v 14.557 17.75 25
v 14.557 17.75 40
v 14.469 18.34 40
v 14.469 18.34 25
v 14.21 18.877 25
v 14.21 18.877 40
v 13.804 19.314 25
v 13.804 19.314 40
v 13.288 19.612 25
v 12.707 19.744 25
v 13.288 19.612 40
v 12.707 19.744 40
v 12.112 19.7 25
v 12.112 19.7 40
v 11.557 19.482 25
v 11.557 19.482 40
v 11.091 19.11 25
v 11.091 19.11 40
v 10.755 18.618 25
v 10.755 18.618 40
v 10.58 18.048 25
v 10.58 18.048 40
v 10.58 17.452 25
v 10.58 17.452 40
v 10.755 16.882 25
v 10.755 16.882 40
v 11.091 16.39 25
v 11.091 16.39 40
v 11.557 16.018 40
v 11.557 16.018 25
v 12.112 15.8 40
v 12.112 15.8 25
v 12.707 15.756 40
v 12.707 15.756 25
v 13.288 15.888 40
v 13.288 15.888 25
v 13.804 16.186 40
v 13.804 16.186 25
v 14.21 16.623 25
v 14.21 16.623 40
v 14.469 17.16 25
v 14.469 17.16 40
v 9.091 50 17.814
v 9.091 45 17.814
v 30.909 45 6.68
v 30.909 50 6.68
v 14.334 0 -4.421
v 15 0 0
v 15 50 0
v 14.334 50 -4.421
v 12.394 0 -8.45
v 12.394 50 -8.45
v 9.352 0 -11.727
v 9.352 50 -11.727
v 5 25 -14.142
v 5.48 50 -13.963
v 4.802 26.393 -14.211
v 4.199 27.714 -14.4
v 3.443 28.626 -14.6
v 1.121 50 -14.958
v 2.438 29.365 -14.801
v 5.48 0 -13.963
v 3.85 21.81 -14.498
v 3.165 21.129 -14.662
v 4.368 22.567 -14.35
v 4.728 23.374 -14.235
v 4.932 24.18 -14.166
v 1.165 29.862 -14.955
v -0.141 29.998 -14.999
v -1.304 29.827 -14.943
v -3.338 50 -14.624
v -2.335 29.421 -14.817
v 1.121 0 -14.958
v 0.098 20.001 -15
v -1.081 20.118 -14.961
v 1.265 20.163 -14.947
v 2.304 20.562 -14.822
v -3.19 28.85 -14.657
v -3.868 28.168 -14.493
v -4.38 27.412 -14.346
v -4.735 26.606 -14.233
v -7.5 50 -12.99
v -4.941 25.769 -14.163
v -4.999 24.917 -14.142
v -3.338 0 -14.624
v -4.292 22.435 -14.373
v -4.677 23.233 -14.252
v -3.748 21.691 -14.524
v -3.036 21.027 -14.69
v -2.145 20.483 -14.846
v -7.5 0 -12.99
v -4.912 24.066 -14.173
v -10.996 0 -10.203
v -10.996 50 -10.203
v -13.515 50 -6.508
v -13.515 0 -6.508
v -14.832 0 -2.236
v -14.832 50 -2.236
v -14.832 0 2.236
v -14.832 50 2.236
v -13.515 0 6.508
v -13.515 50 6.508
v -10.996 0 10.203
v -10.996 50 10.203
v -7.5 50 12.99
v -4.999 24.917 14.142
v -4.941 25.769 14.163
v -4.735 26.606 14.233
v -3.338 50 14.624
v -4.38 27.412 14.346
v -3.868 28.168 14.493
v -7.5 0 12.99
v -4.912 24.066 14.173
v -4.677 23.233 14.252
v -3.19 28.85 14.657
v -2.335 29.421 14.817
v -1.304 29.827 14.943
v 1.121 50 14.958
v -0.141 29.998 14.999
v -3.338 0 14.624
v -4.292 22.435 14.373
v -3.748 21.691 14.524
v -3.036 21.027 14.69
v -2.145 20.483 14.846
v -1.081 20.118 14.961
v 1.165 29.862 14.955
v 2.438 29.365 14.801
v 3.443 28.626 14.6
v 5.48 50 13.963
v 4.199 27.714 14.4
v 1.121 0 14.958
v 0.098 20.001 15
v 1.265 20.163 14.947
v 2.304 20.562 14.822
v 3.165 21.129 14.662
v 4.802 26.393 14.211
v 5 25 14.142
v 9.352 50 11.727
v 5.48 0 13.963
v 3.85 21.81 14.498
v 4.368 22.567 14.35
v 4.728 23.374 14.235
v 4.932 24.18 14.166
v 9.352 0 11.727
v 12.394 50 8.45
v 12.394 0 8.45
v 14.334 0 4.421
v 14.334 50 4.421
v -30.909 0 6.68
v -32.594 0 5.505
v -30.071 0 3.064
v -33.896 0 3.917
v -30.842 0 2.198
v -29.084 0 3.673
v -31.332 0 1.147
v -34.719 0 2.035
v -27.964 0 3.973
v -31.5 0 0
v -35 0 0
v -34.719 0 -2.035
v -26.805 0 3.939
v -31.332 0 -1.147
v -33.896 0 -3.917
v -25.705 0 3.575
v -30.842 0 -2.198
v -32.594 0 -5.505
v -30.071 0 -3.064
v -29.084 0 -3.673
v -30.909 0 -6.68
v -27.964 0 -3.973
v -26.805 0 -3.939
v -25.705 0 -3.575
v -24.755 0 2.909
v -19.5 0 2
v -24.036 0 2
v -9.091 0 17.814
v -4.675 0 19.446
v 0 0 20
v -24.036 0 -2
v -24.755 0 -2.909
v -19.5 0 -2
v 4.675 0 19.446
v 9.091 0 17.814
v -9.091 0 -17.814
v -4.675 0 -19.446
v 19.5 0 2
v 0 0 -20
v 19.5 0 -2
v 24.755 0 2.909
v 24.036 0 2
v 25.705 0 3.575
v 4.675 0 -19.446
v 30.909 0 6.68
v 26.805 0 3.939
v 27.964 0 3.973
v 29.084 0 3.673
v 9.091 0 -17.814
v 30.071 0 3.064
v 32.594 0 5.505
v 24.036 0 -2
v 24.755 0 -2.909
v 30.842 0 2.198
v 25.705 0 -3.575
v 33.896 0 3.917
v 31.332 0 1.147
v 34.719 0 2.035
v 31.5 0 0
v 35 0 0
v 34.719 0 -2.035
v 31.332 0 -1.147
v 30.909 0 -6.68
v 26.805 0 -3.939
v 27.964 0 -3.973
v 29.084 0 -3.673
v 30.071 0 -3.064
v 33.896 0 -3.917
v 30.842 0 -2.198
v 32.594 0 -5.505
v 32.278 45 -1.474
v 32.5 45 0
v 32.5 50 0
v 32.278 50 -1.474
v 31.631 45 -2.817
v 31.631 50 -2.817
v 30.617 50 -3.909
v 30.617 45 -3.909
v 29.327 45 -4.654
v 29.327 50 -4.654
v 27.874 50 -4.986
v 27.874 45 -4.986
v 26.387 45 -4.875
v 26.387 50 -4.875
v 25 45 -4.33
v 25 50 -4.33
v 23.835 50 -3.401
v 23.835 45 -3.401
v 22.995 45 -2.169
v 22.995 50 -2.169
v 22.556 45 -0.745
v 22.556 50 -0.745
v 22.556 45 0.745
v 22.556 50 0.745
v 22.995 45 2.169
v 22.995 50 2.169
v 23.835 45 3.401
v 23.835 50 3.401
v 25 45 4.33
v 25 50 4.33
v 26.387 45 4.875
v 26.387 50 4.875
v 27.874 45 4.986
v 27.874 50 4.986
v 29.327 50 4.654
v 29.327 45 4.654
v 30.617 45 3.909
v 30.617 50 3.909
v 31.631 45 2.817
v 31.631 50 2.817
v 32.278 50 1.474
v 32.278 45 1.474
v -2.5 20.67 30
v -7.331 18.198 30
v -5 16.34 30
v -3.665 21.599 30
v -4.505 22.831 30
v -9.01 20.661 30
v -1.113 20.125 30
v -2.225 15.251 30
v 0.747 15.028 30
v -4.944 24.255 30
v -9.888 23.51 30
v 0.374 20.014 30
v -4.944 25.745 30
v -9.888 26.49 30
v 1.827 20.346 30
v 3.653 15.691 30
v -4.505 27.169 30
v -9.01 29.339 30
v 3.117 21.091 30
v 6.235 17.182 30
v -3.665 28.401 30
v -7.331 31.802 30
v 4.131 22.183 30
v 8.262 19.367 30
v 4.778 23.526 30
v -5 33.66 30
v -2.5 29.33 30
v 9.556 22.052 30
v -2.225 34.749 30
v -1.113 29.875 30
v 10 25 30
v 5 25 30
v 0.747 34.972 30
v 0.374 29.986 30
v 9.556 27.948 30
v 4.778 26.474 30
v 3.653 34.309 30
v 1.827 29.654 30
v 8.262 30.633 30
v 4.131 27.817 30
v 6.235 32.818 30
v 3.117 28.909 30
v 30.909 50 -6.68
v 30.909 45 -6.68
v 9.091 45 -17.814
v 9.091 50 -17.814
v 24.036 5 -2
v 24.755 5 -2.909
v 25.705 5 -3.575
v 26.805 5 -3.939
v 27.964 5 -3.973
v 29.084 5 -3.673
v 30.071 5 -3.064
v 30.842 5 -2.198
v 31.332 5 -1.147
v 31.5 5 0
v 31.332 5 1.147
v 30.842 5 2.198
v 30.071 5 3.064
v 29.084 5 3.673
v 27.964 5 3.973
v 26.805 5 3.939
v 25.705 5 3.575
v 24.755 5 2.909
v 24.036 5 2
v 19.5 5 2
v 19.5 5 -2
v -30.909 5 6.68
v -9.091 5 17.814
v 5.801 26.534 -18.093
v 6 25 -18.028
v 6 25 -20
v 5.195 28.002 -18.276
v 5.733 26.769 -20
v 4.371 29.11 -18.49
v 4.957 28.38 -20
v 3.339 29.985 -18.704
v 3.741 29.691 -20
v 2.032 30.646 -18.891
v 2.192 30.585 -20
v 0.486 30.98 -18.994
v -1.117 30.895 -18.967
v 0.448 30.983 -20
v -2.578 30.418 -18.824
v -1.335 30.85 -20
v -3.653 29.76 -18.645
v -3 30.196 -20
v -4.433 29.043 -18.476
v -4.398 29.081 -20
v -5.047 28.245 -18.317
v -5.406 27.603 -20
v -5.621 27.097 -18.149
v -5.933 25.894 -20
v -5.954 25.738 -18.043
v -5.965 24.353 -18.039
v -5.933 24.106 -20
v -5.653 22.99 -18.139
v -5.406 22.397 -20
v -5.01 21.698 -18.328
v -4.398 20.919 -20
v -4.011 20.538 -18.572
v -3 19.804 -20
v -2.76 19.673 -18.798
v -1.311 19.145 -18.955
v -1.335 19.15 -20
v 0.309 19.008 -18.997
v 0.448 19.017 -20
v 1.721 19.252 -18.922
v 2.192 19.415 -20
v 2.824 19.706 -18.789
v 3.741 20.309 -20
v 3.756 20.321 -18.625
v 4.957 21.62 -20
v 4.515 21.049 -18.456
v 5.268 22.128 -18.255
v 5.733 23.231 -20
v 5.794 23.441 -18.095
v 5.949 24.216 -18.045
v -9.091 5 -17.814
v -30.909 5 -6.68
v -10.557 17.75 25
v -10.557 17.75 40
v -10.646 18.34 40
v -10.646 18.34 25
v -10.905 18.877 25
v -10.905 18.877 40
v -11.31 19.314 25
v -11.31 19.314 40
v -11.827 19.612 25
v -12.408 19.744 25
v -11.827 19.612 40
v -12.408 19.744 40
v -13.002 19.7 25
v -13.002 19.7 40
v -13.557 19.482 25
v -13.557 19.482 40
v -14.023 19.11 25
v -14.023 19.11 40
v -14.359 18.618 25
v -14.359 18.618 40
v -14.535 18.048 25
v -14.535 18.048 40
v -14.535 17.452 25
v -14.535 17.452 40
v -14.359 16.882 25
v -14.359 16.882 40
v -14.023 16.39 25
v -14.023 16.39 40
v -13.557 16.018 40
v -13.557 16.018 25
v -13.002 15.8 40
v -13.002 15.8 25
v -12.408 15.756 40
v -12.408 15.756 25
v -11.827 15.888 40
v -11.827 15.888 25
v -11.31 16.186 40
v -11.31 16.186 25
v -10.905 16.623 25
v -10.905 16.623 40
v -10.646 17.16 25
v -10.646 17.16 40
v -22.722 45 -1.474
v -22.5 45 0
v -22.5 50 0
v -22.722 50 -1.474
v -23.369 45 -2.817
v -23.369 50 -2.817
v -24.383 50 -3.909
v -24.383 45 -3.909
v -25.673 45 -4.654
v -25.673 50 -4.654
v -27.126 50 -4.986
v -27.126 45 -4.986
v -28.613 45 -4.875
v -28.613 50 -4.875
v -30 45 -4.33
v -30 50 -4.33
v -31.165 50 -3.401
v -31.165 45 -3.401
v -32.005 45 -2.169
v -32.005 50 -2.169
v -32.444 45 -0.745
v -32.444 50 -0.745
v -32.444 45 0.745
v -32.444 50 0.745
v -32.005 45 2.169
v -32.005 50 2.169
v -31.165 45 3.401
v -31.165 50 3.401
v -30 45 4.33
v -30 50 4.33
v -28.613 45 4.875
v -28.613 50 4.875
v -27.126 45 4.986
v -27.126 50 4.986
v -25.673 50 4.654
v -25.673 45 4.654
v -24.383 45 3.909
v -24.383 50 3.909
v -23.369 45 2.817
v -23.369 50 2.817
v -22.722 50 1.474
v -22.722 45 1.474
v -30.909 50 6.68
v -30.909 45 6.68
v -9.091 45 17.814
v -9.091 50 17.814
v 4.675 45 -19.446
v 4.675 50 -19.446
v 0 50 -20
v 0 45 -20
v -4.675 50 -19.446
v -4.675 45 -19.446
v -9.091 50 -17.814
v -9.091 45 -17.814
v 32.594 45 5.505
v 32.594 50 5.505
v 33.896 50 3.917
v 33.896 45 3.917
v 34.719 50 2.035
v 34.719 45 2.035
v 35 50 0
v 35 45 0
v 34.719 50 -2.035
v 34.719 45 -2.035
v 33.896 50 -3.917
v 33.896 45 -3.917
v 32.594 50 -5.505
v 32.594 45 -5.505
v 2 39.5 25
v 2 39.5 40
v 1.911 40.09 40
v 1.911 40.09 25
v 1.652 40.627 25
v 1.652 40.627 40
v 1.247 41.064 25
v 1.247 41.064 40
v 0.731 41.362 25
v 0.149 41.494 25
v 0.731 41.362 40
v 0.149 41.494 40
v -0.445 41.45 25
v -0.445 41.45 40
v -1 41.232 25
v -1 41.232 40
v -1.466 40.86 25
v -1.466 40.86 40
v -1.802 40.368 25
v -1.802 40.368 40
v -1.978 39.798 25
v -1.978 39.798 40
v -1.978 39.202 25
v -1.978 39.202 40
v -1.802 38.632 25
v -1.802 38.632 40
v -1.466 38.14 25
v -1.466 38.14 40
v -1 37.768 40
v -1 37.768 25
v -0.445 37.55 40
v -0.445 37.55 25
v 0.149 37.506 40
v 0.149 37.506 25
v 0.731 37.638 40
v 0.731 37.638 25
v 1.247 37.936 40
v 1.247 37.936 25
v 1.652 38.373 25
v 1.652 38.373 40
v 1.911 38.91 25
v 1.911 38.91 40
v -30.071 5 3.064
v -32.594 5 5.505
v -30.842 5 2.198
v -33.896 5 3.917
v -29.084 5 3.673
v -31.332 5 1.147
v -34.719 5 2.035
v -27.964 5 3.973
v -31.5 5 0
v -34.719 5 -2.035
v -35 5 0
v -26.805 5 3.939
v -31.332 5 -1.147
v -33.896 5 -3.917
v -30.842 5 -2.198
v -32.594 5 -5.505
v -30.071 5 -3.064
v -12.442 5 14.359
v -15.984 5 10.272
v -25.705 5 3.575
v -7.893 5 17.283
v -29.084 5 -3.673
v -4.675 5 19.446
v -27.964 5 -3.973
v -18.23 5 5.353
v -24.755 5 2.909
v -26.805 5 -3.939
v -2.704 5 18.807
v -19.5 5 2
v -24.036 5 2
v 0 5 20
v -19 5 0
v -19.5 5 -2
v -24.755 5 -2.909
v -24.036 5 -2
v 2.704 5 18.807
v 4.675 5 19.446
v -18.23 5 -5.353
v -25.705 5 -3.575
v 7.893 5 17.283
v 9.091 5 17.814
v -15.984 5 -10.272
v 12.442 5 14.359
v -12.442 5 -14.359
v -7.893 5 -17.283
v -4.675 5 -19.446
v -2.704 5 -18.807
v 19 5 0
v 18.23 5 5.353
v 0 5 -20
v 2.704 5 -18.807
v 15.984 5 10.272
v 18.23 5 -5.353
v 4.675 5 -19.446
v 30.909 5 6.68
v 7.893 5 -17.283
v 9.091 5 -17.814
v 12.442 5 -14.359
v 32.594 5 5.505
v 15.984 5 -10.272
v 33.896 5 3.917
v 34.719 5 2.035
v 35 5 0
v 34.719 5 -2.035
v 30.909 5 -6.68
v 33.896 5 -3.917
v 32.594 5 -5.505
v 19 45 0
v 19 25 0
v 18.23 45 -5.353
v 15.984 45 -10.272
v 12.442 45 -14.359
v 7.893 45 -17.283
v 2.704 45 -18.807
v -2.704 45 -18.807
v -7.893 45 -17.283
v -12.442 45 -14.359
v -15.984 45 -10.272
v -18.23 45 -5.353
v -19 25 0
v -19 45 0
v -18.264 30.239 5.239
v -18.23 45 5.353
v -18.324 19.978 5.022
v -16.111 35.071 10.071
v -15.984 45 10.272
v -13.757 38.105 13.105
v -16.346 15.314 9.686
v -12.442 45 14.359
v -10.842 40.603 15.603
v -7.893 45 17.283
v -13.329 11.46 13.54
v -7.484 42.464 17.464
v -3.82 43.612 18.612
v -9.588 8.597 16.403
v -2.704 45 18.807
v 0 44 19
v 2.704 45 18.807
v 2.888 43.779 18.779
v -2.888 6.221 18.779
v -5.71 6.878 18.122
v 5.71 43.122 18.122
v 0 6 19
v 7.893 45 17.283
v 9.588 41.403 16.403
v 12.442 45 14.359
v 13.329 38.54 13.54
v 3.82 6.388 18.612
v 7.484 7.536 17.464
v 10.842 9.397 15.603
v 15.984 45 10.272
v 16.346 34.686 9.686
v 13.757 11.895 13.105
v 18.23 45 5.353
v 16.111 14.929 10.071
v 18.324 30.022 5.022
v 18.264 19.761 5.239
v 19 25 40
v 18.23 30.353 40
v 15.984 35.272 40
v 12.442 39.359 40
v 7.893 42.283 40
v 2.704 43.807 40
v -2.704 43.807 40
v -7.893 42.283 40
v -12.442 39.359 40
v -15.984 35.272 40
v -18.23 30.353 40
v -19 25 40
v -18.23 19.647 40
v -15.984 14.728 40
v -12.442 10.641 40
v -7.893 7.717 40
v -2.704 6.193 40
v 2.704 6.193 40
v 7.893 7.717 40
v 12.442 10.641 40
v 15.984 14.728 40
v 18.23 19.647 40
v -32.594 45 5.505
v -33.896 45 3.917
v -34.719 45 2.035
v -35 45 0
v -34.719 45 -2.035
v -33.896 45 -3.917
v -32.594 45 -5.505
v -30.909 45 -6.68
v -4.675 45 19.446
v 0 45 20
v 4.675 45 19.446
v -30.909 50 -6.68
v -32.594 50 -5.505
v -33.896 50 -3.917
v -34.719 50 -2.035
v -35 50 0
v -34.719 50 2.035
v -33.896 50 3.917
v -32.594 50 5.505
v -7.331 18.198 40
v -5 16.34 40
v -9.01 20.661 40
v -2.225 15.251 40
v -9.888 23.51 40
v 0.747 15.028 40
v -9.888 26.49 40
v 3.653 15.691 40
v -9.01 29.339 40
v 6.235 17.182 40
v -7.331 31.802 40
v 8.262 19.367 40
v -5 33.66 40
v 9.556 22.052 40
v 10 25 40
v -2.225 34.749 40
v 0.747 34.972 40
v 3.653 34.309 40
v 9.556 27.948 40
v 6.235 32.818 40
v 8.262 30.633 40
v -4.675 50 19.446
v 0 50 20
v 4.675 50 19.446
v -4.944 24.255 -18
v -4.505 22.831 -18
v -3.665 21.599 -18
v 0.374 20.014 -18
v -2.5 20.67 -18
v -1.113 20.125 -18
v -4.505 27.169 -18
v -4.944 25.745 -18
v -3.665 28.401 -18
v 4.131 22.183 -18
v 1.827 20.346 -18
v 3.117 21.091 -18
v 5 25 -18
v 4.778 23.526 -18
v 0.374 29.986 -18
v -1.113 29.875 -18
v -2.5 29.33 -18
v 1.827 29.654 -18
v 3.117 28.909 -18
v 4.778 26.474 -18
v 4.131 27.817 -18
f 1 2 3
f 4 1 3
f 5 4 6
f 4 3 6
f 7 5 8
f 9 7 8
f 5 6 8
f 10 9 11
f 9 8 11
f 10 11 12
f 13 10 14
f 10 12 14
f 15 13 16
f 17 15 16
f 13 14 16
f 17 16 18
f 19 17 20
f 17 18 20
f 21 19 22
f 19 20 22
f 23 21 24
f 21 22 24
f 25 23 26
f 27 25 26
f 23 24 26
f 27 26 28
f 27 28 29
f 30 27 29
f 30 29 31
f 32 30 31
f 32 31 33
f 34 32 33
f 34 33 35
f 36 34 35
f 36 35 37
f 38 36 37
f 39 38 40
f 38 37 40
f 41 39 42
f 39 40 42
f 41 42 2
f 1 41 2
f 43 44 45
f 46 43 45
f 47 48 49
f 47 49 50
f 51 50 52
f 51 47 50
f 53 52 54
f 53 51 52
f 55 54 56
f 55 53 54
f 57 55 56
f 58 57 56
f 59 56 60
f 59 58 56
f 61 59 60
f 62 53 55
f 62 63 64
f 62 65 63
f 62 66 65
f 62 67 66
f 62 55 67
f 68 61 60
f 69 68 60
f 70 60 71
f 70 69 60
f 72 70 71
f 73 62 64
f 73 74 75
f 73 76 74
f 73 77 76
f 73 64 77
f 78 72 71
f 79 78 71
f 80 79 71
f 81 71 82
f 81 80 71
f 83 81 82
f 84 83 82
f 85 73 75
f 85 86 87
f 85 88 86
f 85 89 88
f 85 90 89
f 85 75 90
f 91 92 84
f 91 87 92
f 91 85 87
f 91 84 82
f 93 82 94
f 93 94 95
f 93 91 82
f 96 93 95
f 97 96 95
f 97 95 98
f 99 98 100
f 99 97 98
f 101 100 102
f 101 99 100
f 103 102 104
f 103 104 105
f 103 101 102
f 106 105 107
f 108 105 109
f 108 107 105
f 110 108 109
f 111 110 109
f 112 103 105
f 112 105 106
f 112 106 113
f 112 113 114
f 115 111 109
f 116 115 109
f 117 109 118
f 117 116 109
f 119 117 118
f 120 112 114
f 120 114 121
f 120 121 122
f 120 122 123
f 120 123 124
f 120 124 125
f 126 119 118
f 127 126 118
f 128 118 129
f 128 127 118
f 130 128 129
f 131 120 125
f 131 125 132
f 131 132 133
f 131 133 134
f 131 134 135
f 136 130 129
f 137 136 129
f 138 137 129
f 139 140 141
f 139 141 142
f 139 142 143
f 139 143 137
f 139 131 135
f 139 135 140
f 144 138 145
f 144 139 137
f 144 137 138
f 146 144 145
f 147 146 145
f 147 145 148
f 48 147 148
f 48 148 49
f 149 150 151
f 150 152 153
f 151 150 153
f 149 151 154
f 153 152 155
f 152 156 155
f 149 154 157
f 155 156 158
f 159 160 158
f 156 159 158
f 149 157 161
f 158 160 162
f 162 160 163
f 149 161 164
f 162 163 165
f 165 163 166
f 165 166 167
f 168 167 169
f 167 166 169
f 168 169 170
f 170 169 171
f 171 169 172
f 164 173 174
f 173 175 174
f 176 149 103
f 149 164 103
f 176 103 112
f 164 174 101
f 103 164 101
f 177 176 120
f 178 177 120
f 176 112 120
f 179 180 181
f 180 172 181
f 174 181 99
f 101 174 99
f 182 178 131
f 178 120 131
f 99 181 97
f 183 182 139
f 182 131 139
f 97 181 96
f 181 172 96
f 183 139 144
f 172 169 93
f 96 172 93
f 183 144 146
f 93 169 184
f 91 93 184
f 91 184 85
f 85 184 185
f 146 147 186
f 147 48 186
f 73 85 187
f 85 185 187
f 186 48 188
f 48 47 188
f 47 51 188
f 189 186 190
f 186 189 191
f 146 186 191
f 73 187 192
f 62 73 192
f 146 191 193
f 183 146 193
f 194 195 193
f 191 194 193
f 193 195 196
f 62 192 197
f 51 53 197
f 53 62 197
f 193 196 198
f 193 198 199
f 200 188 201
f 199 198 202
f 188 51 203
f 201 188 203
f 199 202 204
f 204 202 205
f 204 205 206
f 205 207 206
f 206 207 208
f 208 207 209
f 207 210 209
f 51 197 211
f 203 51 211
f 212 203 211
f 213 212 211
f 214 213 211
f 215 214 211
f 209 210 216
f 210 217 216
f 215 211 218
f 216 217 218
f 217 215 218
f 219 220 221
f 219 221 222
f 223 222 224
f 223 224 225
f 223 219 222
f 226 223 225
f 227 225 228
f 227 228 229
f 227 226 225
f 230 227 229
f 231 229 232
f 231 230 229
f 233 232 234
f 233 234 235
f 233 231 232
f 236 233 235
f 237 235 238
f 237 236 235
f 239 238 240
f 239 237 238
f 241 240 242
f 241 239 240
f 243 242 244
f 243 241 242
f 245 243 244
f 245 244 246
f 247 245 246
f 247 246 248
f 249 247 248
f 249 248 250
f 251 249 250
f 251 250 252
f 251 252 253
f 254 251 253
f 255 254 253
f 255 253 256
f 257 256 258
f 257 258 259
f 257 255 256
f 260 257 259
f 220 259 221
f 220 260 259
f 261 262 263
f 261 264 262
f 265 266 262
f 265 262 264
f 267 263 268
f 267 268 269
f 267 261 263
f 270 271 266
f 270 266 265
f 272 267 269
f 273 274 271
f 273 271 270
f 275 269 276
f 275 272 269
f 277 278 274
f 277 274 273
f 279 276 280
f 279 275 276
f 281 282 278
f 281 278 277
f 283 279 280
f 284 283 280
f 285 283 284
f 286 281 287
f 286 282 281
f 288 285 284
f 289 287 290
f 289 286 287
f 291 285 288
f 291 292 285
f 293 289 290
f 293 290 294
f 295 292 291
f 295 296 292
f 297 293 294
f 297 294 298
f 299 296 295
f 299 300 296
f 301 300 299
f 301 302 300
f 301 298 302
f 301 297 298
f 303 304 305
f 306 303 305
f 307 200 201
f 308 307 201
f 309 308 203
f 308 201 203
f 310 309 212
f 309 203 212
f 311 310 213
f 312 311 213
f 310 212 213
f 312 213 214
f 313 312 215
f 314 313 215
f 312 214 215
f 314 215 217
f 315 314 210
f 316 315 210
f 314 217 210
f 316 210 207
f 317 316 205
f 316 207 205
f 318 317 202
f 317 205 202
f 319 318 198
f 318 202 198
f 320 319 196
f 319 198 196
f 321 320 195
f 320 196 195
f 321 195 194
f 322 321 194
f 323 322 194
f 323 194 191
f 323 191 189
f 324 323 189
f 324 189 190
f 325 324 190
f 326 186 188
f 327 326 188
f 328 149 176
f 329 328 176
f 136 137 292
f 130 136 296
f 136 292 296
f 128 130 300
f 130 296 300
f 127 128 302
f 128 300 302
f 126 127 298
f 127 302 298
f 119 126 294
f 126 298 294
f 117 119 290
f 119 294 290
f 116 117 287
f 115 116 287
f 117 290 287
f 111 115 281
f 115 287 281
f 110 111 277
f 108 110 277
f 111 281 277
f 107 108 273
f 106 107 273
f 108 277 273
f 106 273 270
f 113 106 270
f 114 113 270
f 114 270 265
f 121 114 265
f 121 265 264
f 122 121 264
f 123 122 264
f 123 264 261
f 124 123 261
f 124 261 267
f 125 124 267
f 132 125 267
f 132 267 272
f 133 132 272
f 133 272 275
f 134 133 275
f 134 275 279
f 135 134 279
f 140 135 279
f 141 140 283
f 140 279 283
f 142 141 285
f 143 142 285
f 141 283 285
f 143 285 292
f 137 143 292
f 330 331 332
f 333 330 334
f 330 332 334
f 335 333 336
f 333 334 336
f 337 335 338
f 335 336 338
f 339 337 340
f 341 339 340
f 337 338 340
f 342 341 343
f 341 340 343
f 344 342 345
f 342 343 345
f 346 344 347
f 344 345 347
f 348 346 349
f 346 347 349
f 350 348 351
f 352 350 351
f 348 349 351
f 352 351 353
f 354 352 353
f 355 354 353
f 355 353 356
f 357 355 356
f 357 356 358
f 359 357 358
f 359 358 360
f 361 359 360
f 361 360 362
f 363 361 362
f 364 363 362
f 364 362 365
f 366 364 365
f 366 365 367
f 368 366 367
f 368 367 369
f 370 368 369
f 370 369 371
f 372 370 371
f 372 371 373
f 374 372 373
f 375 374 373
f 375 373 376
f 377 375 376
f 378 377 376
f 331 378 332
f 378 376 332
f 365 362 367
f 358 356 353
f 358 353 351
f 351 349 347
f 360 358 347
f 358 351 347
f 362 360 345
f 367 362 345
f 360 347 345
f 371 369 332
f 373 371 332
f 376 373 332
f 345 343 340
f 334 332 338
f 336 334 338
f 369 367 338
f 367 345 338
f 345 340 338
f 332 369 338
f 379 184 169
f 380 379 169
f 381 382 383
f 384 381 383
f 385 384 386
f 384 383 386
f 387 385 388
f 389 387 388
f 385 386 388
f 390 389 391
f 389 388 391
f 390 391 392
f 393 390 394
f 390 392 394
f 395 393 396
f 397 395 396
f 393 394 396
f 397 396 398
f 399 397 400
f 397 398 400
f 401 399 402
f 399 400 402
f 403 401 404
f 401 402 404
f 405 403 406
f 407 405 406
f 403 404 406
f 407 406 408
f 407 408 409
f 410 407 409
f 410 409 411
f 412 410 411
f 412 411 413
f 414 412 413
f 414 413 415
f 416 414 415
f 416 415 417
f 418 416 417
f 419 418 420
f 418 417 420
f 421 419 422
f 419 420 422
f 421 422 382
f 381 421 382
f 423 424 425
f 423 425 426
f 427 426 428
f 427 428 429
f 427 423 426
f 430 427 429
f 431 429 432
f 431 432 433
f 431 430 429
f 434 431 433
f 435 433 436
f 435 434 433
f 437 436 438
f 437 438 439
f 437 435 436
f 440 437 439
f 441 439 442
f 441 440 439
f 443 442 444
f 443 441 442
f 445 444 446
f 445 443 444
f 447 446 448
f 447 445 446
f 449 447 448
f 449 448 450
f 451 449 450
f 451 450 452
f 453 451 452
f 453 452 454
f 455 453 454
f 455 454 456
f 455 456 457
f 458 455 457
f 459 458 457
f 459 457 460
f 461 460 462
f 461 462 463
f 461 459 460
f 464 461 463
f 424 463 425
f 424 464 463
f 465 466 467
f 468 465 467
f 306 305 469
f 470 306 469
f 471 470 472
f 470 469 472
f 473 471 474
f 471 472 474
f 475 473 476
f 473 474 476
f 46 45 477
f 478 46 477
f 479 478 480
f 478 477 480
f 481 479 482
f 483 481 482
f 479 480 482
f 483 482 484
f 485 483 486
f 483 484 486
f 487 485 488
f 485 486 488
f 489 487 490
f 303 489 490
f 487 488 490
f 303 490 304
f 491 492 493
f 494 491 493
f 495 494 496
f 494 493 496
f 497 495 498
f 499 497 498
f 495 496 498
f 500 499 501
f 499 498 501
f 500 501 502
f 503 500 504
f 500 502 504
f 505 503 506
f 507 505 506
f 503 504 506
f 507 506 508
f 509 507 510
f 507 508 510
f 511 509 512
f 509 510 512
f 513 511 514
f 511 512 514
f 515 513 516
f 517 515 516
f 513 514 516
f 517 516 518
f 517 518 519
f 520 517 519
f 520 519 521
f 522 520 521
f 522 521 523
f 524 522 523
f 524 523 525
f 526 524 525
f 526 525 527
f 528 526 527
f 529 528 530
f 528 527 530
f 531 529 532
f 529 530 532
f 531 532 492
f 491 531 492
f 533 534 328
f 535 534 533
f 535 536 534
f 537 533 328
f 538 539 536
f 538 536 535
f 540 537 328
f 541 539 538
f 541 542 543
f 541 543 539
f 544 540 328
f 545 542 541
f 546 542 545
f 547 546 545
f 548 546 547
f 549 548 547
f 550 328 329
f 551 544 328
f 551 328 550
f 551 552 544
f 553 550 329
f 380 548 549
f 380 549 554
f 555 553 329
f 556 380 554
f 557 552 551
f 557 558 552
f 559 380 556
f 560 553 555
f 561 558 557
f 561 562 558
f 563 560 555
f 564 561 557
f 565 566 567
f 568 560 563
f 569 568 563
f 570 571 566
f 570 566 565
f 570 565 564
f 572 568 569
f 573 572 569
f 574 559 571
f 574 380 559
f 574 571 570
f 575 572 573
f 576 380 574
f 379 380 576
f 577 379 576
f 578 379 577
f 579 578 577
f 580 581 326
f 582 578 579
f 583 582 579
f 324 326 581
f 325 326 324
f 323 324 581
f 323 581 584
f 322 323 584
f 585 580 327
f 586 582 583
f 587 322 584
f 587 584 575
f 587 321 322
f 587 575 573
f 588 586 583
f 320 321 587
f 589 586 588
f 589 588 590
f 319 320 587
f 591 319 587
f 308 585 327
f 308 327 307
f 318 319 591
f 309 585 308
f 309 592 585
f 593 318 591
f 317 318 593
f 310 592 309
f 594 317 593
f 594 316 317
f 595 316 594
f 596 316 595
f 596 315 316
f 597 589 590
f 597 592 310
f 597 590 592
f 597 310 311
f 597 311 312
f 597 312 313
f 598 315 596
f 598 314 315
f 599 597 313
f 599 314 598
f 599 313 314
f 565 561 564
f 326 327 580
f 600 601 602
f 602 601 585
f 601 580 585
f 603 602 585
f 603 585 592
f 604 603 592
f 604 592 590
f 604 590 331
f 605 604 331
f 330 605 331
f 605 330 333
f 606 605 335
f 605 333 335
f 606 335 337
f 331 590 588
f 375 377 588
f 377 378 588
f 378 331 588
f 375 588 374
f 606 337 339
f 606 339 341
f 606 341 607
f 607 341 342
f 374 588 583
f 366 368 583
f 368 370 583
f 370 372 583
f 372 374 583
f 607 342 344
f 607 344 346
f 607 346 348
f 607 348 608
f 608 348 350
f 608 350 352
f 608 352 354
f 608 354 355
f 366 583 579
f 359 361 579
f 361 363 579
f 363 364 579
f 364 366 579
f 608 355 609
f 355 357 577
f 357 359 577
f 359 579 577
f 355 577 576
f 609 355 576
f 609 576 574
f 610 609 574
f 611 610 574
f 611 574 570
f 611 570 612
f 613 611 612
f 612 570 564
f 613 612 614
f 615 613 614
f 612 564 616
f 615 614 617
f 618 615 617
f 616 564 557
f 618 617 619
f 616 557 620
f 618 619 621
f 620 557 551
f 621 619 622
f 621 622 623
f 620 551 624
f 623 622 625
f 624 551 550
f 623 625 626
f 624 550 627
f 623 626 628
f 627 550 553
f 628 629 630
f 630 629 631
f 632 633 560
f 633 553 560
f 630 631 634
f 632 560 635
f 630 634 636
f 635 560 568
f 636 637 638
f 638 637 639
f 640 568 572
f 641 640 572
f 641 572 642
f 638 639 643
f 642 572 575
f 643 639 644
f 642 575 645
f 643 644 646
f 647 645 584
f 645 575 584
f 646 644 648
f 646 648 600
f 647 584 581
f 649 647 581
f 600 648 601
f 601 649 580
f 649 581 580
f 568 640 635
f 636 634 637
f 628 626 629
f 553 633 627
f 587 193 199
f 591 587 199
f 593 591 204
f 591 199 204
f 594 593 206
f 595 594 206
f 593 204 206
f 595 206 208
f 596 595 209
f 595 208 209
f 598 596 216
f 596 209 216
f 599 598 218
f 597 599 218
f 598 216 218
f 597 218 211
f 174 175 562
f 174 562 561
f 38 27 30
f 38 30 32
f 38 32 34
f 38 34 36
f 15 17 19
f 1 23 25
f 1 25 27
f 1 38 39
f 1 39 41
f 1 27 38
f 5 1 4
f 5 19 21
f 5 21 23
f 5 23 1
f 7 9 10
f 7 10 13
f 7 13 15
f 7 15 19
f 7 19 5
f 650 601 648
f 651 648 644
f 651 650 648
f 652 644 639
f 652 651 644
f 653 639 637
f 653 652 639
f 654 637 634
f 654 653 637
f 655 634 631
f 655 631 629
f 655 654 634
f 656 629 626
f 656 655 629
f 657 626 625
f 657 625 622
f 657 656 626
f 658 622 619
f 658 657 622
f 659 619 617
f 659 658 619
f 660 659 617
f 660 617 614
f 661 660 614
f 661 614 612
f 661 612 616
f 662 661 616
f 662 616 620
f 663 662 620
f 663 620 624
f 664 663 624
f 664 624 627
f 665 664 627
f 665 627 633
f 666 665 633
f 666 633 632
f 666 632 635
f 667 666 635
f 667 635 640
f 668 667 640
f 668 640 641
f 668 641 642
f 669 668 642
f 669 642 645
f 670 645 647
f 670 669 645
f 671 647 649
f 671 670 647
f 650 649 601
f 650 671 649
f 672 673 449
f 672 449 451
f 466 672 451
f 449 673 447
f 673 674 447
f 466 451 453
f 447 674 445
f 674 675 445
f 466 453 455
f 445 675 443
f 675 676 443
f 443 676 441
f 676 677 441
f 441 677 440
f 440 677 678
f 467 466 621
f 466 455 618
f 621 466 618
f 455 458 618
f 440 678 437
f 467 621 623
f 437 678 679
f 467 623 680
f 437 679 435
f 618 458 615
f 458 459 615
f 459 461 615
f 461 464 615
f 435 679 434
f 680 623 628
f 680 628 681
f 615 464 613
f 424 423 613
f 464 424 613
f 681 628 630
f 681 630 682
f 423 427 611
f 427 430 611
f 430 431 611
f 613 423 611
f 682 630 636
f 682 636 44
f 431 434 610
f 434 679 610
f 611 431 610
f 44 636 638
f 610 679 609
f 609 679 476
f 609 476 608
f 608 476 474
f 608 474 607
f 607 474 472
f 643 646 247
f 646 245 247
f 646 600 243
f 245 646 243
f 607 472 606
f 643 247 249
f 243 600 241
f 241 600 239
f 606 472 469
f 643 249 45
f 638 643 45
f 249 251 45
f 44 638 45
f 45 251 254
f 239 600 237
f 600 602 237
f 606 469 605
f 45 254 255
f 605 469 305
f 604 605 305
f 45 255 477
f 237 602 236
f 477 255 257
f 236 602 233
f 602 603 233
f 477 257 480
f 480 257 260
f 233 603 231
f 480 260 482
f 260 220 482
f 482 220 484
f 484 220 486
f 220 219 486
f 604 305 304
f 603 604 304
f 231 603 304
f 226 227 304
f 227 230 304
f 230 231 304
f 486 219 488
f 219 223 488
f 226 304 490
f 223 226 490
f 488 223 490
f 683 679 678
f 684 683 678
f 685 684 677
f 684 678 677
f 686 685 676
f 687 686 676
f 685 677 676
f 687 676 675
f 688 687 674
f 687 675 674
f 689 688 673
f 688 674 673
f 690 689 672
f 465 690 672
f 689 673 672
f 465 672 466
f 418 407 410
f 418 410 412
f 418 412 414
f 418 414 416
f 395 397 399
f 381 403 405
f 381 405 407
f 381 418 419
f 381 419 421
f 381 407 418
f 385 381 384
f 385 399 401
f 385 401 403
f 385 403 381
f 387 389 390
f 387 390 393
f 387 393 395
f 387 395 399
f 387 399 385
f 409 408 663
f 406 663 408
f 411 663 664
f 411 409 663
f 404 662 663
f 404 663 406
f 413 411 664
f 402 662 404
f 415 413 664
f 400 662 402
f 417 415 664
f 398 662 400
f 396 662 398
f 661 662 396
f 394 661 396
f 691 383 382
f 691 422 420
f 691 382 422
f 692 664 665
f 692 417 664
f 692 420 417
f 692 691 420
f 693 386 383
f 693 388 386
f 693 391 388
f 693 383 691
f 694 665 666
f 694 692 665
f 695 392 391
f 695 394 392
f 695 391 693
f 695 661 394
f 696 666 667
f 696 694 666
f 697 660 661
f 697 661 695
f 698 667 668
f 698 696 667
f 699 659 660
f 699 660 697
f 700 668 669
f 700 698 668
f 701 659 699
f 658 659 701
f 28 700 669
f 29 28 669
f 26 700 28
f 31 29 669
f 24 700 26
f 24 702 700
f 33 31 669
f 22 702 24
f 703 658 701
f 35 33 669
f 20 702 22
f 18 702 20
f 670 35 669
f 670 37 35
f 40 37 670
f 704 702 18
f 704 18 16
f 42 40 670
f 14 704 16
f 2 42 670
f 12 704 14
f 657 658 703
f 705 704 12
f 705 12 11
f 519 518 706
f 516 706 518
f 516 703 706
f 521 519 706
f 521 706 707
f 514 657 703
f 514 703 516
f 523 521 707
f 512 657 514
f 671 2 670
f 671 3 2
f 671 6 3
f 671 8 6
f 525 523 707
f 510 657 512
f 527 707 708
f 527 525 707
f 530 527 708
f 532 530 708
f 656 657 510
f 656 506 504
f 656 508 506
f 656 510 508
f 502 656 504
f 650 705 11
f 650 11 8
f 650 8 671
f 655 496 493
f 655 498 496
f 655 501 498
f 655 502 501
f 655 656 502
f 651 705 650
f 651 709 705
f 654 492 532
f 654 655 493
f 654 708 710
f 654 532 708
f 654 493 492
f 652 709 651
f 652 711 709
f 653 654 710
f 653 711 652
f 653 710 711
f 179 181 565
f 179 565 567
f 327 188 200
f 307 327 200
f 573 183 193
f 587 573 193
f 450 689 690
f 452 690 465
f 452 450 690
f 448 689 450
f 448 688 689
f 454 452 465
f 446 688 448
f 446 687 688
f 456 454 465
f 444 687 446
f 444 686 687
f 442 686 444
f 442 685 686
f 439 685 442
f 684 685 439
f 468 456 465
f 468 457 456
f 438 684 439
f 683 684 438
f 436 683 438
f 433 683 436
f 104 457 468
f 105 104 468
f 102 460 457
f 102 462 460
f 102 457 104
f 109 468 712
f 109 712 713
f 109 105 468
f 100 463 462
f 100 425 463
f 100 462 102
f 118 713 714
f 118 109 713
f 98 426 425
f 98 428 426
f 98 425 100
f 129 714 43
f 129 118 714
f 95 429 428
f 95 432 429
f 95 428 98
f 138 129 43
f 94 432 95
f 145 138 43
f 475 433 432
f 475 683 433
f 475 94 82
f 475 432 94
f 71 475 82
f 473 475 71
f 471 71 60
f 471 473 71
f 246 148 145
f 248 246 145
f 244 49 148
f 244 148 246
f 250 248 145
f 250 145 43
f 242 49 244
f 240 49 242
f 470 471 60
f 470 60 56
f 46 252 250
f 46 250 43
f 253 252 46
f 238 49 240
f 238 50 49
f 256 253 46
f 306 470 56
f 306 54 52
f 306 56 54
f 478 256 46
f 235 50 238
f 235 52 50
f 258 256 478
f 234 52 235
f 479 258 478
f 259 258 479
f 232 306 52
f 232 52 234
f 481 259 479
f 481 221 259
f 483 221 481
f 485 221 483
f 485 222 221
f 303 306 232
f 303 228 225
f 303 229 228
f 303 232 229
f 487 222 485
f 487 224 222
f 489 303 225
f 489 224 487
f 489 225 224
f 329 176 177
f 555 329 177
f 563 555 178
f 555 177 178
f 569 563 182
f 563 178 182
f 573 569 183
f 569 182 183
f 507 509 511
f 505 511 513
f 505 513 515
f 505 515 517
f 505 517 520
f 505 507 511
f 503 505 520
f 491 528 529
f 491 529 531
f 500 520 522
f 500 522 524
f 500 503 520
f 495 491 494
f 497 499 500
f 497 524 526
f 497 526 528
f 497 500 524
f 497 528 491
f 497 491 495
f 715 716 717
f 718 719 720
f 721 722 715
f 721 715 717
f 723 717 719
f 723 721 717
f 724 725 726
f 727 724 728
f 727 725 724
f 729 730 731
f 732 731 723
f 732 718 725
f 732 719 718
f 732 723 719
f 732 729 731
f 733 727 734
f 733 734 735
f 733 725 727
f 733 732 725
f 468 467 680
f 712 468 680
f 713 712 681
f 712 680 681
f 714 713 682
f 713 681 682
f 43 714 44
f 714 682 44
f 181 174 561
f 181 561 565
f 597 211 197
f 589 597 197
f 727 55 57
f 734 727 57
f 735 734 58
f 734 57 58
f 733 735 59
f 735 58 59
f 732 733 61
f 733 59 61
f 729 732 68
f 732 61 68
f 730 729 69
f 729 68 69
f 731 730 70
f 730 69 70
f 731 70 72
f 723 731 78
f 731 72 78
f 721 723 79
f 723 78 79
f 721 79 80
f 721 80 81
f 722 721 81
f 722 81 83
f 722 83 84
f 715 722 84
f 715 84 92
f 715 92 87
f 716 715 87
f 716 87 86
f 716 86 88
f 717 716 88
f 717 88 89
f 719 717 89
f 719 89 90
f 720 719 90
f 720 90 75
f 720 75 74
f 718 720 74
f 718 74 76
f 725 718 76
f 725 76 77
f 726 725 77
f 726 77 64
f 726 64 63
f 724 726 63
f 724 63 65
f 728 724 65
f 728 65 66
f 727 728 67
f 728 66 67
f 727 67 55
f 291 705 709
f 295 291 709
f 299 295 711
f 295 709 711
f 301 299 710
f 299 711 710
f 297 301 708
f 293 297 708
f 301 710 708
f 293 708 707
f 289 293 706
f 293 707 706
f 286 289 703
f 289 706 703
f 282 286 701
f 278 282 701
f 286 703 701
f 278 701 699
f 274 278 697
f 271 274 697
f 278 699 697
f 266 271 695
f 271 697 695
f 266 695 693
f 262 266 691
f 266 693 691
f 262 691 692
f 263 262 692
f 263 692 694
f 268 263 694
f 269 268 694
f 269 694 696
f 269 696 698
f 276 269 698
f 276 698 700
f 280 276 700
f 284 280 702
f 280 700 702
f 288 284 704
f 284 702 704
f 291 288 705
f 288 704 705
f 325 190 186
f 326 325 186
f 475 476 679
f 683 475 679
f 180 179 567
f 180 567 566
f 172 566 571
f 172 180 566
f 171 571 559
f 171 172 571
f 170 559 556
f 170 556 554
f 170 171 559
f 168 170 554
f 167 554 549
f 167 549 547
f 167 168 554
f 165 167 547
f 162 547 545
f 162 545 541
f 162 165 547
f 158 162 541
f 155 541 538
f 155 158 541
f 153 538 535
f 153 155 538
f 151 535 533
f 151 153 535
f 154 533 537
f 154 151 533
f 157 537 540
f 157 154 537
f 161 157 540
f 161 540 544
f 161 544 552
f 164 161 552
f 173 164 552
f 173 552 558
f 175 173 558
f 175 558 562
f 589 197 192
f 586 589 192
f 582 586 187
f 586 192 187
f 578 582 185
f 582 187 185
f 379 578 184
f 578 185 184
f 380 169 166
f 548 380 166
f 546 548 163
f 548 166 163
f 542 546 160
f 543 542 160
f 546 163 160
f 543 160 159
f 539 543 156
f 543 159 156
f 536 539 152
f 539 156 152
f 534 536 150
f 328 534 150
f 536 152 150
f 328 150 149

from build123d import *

# Parameters (mm, degrees)
SKETCH1_R           = 15
BOSS_EXTRUDE1_DEPTH = 5
SKETCH2_R           = 19
SKETCH2_R_2         = 15
BOSS_EXTRUDE2_DEPTH = 40
SKETCH3_R           = 5
SKETCH3_R_2         = 15
BOSS_EXTRUDE4_DEPTH = 5
BOSS_EXTRUDE5_REACH = 62
SKETCH4_R           = 19
SKETCH5_R           = 10
CUT_EXTRUDE1_DEPTH  = 10
SKETCH6_R           = 5
CUT_EXTRUDE2_DEPTH  = 48
BOSS_EXTRUDE6_REACH = 62
SKETCH7_R           = 6
SKETCH8_R           = 2
CUT_EXTRUDE3_DEPTH  = 15


with BuildPart() as part:
    # Sketch1 → Boss-Extrude1 (new body)
    with BuildSketch(Plane(origin=(0, 0, 0), x_dir=(1, 0, 0), z_dir=(0, 1, 0))):
        with BuildLine():
            Line((-9.090909091, 17.814470857), (-30.909090909, 6.680426571))
            ThreePointArc((-30.909090909, 6.680426571), (-35, 0), (-30.909090909, -6.680426571))
            Line((-30.909090909, -6.680426571), (-9.090909091, -17.814470857))
            ThreePointArc((-9.090909091, -17.814470857), (0, -20), (9.090909091, -17.814470857))
            Line((9.090909091, -17.814470857), (30.909090909, -6.680426571))
            ThreePointArc((30.909090909, -6.680426571), (35, 0), (30.909090909, 6.680426571))
            Line((30.909090909, 6.680426571), (9.090909091, 17.814470857))
            ThreePointArc((9.090909091, 17.814470857), (0, 20), (-9.090909091, 17.814470857))
        make_face()
        Circle(SKETCH1_R, mode=Mode.SUBTRACT)
        with BuildLine():
            Line((-23.5, 2), (-24.035898385, 2))
            ThreePointArc((-24.035898385, 2), (-31.5, 0), (-24.035898385, -2))
            Line((-24.035898385, -2), (-23.5, -2))
            Line((-23.5, -2), (-19.5, -2))
            Line((-19.5, -2), (-19.5, 2))
            Line((-19.5, 2), (-23.5, 2))
        make_face(mode=Mode.SUBTRACT)
        with BuildLine():
            Line((23.5, 2), (24.035898385, 2))
            ThreePointArc((24.035898385, 2), (31.5, 0), (24.035898385, -2))
            Line((24.035898385, -2), (23.5, -2))
            Line((23.5, -2), (19.5, -2))
            Line((19.5, -2), (19.5, 2))
            Line((19.5, 2), (23.5, 2))
        make_face(mode=Mode.SUBTRACT)
    extrude(amount=BOSS_EXTRUDE1_DEPTH)

    # Sketch2 → Boss-Extrude2 (add)
    with BuildSketch(Plane(origin=(0, 5, 0), x_dir=(1, 0, 0), z_dir=(0, 1, 0))):
        Circle(SKETCH2_R)
        Circle(SKETCH2_R_2, mode=Mode.SUBTRACT)
    extrude(amount=BOSS_EXTRUDE2_DEPTH)

    # Sketch3 → Boss-Extrude4 (add)
    with BuildSketch(Plane(origin=(0, 45, 0), x_dir=(1, 0, 0), z_dir=(0, 1, 0))):
        with BuildLine():
            Line((9.090909091, -17.814470857), (30.909090909, -6.680426571))
            ThreePointArc((30.909090909, -6.680426571), (35, 0), (30.909090909, 6.680426571))
            Line((30.909090909, 6.680426571), (9.090909091, 17.814470857))
            ThreePointArc((9.090909091, 17.814470857), (0, 20), (-9.090909091, 17.814470857))
            Line((-9.090909091, 17.814470857), (-30.909090909, 6.680426571))
            ThreePointArc((-30.909090909, 6.680426571), (-35, 0), (-30.909090909, -6.680426571))
            Line((-30.909090909, -6.680426571), (-9.090909091, -17.814470857))
            ThreePointArc((-9.090909091, -17.814470857), (0, -20), (9.090909091, -17.814470857))
        make_face()
        with Locations((-27.5, 0)):
            Circle(SKETCH3_R, mode=Mode.SUBTRACT)
        with Locations((27.5, 0)):
            Circle(SKETCH3_R, mode=Mode.SUBTRACT)
        Circle(SKETCH3_R_2, mode=Mode.SUBTRACT)
    extrude(amount=BOSS_EXTRUDE4_DEPTH)

    # Sketch4 → Boss-Extrude5 (add, up to next)
    with BuildSketch(Plane.XY.offset(40), mode=Mode.PRIVATE) as boss_extrude5_sk1:
        with Locations((0, 25)):
            Circle(SKETCH4_R)
    boss_extrude5_tool1 = extrude(boss_extrude5_sk1.sketch, amount=-BOSS_EXTRUDE5_REACH, mode=Mode.PRIVATE) - part.part
    add(boss_extrude5_tool1.solids().sort_by_distance((0, 25, 40))[0])

    # Sketch5 → Cut-Extrude1 (cut)
    with BuildSketch(Plane.XY.offset(40)):
        with Locations((0, 25)):
            Circle(SKETCH5_R)
    extrude(amount=-CUT_EXTRUDE1_DEPTH, mode=Mode.SUBTRACT)

    # Sketch6 → Cut-Extrude2 (cut)
    with BuildSketch(Plane.XY.offset(30)):
        with Locations((0, 25)):
            Circle(SKETCH6_R)
    extrude(amount=-CUT_EXTRUDE2_DEPTH, mode=Mode.SUBTRACT)

    # Sketch7 → Boss-Extrude6 (add, up to next)
    with BuildSketch(Plane.XY.offset(-20), mode=Mode.PRIVATE) as boss_extrude6_sk1:
        with Locations((0, 25)):
            Circle(SKETCH7_R)
    boss_extrude6_tool1 = extrude(boss_extrude6_sk1.sketch, amount=BOSS_EXTRUDE6_REACH, mode=Mode.PRIVATE) - part.part
    add(boss_extrude6_tool1.solids().sort_by_distance((0, 25, -20))[0])

    # Sketch8 → Cut-Extrude3 (cut)
    with BuildSketch(Plane.XY.offset(40)):
        with Locations((0, 39.5)):
            Circle(SKETCH8_R)
        with Locations((12.557368355, 17.75)):
            Circle(SKETCH8_R)
        with Locations((-12.557368355, 17.75)):
            Circle(SKETCH8_R)
    extrude(amount=-CUT_EXTRUDE3_DEPTH, mode=Mode.SUBTRACT)


solid = part.part
